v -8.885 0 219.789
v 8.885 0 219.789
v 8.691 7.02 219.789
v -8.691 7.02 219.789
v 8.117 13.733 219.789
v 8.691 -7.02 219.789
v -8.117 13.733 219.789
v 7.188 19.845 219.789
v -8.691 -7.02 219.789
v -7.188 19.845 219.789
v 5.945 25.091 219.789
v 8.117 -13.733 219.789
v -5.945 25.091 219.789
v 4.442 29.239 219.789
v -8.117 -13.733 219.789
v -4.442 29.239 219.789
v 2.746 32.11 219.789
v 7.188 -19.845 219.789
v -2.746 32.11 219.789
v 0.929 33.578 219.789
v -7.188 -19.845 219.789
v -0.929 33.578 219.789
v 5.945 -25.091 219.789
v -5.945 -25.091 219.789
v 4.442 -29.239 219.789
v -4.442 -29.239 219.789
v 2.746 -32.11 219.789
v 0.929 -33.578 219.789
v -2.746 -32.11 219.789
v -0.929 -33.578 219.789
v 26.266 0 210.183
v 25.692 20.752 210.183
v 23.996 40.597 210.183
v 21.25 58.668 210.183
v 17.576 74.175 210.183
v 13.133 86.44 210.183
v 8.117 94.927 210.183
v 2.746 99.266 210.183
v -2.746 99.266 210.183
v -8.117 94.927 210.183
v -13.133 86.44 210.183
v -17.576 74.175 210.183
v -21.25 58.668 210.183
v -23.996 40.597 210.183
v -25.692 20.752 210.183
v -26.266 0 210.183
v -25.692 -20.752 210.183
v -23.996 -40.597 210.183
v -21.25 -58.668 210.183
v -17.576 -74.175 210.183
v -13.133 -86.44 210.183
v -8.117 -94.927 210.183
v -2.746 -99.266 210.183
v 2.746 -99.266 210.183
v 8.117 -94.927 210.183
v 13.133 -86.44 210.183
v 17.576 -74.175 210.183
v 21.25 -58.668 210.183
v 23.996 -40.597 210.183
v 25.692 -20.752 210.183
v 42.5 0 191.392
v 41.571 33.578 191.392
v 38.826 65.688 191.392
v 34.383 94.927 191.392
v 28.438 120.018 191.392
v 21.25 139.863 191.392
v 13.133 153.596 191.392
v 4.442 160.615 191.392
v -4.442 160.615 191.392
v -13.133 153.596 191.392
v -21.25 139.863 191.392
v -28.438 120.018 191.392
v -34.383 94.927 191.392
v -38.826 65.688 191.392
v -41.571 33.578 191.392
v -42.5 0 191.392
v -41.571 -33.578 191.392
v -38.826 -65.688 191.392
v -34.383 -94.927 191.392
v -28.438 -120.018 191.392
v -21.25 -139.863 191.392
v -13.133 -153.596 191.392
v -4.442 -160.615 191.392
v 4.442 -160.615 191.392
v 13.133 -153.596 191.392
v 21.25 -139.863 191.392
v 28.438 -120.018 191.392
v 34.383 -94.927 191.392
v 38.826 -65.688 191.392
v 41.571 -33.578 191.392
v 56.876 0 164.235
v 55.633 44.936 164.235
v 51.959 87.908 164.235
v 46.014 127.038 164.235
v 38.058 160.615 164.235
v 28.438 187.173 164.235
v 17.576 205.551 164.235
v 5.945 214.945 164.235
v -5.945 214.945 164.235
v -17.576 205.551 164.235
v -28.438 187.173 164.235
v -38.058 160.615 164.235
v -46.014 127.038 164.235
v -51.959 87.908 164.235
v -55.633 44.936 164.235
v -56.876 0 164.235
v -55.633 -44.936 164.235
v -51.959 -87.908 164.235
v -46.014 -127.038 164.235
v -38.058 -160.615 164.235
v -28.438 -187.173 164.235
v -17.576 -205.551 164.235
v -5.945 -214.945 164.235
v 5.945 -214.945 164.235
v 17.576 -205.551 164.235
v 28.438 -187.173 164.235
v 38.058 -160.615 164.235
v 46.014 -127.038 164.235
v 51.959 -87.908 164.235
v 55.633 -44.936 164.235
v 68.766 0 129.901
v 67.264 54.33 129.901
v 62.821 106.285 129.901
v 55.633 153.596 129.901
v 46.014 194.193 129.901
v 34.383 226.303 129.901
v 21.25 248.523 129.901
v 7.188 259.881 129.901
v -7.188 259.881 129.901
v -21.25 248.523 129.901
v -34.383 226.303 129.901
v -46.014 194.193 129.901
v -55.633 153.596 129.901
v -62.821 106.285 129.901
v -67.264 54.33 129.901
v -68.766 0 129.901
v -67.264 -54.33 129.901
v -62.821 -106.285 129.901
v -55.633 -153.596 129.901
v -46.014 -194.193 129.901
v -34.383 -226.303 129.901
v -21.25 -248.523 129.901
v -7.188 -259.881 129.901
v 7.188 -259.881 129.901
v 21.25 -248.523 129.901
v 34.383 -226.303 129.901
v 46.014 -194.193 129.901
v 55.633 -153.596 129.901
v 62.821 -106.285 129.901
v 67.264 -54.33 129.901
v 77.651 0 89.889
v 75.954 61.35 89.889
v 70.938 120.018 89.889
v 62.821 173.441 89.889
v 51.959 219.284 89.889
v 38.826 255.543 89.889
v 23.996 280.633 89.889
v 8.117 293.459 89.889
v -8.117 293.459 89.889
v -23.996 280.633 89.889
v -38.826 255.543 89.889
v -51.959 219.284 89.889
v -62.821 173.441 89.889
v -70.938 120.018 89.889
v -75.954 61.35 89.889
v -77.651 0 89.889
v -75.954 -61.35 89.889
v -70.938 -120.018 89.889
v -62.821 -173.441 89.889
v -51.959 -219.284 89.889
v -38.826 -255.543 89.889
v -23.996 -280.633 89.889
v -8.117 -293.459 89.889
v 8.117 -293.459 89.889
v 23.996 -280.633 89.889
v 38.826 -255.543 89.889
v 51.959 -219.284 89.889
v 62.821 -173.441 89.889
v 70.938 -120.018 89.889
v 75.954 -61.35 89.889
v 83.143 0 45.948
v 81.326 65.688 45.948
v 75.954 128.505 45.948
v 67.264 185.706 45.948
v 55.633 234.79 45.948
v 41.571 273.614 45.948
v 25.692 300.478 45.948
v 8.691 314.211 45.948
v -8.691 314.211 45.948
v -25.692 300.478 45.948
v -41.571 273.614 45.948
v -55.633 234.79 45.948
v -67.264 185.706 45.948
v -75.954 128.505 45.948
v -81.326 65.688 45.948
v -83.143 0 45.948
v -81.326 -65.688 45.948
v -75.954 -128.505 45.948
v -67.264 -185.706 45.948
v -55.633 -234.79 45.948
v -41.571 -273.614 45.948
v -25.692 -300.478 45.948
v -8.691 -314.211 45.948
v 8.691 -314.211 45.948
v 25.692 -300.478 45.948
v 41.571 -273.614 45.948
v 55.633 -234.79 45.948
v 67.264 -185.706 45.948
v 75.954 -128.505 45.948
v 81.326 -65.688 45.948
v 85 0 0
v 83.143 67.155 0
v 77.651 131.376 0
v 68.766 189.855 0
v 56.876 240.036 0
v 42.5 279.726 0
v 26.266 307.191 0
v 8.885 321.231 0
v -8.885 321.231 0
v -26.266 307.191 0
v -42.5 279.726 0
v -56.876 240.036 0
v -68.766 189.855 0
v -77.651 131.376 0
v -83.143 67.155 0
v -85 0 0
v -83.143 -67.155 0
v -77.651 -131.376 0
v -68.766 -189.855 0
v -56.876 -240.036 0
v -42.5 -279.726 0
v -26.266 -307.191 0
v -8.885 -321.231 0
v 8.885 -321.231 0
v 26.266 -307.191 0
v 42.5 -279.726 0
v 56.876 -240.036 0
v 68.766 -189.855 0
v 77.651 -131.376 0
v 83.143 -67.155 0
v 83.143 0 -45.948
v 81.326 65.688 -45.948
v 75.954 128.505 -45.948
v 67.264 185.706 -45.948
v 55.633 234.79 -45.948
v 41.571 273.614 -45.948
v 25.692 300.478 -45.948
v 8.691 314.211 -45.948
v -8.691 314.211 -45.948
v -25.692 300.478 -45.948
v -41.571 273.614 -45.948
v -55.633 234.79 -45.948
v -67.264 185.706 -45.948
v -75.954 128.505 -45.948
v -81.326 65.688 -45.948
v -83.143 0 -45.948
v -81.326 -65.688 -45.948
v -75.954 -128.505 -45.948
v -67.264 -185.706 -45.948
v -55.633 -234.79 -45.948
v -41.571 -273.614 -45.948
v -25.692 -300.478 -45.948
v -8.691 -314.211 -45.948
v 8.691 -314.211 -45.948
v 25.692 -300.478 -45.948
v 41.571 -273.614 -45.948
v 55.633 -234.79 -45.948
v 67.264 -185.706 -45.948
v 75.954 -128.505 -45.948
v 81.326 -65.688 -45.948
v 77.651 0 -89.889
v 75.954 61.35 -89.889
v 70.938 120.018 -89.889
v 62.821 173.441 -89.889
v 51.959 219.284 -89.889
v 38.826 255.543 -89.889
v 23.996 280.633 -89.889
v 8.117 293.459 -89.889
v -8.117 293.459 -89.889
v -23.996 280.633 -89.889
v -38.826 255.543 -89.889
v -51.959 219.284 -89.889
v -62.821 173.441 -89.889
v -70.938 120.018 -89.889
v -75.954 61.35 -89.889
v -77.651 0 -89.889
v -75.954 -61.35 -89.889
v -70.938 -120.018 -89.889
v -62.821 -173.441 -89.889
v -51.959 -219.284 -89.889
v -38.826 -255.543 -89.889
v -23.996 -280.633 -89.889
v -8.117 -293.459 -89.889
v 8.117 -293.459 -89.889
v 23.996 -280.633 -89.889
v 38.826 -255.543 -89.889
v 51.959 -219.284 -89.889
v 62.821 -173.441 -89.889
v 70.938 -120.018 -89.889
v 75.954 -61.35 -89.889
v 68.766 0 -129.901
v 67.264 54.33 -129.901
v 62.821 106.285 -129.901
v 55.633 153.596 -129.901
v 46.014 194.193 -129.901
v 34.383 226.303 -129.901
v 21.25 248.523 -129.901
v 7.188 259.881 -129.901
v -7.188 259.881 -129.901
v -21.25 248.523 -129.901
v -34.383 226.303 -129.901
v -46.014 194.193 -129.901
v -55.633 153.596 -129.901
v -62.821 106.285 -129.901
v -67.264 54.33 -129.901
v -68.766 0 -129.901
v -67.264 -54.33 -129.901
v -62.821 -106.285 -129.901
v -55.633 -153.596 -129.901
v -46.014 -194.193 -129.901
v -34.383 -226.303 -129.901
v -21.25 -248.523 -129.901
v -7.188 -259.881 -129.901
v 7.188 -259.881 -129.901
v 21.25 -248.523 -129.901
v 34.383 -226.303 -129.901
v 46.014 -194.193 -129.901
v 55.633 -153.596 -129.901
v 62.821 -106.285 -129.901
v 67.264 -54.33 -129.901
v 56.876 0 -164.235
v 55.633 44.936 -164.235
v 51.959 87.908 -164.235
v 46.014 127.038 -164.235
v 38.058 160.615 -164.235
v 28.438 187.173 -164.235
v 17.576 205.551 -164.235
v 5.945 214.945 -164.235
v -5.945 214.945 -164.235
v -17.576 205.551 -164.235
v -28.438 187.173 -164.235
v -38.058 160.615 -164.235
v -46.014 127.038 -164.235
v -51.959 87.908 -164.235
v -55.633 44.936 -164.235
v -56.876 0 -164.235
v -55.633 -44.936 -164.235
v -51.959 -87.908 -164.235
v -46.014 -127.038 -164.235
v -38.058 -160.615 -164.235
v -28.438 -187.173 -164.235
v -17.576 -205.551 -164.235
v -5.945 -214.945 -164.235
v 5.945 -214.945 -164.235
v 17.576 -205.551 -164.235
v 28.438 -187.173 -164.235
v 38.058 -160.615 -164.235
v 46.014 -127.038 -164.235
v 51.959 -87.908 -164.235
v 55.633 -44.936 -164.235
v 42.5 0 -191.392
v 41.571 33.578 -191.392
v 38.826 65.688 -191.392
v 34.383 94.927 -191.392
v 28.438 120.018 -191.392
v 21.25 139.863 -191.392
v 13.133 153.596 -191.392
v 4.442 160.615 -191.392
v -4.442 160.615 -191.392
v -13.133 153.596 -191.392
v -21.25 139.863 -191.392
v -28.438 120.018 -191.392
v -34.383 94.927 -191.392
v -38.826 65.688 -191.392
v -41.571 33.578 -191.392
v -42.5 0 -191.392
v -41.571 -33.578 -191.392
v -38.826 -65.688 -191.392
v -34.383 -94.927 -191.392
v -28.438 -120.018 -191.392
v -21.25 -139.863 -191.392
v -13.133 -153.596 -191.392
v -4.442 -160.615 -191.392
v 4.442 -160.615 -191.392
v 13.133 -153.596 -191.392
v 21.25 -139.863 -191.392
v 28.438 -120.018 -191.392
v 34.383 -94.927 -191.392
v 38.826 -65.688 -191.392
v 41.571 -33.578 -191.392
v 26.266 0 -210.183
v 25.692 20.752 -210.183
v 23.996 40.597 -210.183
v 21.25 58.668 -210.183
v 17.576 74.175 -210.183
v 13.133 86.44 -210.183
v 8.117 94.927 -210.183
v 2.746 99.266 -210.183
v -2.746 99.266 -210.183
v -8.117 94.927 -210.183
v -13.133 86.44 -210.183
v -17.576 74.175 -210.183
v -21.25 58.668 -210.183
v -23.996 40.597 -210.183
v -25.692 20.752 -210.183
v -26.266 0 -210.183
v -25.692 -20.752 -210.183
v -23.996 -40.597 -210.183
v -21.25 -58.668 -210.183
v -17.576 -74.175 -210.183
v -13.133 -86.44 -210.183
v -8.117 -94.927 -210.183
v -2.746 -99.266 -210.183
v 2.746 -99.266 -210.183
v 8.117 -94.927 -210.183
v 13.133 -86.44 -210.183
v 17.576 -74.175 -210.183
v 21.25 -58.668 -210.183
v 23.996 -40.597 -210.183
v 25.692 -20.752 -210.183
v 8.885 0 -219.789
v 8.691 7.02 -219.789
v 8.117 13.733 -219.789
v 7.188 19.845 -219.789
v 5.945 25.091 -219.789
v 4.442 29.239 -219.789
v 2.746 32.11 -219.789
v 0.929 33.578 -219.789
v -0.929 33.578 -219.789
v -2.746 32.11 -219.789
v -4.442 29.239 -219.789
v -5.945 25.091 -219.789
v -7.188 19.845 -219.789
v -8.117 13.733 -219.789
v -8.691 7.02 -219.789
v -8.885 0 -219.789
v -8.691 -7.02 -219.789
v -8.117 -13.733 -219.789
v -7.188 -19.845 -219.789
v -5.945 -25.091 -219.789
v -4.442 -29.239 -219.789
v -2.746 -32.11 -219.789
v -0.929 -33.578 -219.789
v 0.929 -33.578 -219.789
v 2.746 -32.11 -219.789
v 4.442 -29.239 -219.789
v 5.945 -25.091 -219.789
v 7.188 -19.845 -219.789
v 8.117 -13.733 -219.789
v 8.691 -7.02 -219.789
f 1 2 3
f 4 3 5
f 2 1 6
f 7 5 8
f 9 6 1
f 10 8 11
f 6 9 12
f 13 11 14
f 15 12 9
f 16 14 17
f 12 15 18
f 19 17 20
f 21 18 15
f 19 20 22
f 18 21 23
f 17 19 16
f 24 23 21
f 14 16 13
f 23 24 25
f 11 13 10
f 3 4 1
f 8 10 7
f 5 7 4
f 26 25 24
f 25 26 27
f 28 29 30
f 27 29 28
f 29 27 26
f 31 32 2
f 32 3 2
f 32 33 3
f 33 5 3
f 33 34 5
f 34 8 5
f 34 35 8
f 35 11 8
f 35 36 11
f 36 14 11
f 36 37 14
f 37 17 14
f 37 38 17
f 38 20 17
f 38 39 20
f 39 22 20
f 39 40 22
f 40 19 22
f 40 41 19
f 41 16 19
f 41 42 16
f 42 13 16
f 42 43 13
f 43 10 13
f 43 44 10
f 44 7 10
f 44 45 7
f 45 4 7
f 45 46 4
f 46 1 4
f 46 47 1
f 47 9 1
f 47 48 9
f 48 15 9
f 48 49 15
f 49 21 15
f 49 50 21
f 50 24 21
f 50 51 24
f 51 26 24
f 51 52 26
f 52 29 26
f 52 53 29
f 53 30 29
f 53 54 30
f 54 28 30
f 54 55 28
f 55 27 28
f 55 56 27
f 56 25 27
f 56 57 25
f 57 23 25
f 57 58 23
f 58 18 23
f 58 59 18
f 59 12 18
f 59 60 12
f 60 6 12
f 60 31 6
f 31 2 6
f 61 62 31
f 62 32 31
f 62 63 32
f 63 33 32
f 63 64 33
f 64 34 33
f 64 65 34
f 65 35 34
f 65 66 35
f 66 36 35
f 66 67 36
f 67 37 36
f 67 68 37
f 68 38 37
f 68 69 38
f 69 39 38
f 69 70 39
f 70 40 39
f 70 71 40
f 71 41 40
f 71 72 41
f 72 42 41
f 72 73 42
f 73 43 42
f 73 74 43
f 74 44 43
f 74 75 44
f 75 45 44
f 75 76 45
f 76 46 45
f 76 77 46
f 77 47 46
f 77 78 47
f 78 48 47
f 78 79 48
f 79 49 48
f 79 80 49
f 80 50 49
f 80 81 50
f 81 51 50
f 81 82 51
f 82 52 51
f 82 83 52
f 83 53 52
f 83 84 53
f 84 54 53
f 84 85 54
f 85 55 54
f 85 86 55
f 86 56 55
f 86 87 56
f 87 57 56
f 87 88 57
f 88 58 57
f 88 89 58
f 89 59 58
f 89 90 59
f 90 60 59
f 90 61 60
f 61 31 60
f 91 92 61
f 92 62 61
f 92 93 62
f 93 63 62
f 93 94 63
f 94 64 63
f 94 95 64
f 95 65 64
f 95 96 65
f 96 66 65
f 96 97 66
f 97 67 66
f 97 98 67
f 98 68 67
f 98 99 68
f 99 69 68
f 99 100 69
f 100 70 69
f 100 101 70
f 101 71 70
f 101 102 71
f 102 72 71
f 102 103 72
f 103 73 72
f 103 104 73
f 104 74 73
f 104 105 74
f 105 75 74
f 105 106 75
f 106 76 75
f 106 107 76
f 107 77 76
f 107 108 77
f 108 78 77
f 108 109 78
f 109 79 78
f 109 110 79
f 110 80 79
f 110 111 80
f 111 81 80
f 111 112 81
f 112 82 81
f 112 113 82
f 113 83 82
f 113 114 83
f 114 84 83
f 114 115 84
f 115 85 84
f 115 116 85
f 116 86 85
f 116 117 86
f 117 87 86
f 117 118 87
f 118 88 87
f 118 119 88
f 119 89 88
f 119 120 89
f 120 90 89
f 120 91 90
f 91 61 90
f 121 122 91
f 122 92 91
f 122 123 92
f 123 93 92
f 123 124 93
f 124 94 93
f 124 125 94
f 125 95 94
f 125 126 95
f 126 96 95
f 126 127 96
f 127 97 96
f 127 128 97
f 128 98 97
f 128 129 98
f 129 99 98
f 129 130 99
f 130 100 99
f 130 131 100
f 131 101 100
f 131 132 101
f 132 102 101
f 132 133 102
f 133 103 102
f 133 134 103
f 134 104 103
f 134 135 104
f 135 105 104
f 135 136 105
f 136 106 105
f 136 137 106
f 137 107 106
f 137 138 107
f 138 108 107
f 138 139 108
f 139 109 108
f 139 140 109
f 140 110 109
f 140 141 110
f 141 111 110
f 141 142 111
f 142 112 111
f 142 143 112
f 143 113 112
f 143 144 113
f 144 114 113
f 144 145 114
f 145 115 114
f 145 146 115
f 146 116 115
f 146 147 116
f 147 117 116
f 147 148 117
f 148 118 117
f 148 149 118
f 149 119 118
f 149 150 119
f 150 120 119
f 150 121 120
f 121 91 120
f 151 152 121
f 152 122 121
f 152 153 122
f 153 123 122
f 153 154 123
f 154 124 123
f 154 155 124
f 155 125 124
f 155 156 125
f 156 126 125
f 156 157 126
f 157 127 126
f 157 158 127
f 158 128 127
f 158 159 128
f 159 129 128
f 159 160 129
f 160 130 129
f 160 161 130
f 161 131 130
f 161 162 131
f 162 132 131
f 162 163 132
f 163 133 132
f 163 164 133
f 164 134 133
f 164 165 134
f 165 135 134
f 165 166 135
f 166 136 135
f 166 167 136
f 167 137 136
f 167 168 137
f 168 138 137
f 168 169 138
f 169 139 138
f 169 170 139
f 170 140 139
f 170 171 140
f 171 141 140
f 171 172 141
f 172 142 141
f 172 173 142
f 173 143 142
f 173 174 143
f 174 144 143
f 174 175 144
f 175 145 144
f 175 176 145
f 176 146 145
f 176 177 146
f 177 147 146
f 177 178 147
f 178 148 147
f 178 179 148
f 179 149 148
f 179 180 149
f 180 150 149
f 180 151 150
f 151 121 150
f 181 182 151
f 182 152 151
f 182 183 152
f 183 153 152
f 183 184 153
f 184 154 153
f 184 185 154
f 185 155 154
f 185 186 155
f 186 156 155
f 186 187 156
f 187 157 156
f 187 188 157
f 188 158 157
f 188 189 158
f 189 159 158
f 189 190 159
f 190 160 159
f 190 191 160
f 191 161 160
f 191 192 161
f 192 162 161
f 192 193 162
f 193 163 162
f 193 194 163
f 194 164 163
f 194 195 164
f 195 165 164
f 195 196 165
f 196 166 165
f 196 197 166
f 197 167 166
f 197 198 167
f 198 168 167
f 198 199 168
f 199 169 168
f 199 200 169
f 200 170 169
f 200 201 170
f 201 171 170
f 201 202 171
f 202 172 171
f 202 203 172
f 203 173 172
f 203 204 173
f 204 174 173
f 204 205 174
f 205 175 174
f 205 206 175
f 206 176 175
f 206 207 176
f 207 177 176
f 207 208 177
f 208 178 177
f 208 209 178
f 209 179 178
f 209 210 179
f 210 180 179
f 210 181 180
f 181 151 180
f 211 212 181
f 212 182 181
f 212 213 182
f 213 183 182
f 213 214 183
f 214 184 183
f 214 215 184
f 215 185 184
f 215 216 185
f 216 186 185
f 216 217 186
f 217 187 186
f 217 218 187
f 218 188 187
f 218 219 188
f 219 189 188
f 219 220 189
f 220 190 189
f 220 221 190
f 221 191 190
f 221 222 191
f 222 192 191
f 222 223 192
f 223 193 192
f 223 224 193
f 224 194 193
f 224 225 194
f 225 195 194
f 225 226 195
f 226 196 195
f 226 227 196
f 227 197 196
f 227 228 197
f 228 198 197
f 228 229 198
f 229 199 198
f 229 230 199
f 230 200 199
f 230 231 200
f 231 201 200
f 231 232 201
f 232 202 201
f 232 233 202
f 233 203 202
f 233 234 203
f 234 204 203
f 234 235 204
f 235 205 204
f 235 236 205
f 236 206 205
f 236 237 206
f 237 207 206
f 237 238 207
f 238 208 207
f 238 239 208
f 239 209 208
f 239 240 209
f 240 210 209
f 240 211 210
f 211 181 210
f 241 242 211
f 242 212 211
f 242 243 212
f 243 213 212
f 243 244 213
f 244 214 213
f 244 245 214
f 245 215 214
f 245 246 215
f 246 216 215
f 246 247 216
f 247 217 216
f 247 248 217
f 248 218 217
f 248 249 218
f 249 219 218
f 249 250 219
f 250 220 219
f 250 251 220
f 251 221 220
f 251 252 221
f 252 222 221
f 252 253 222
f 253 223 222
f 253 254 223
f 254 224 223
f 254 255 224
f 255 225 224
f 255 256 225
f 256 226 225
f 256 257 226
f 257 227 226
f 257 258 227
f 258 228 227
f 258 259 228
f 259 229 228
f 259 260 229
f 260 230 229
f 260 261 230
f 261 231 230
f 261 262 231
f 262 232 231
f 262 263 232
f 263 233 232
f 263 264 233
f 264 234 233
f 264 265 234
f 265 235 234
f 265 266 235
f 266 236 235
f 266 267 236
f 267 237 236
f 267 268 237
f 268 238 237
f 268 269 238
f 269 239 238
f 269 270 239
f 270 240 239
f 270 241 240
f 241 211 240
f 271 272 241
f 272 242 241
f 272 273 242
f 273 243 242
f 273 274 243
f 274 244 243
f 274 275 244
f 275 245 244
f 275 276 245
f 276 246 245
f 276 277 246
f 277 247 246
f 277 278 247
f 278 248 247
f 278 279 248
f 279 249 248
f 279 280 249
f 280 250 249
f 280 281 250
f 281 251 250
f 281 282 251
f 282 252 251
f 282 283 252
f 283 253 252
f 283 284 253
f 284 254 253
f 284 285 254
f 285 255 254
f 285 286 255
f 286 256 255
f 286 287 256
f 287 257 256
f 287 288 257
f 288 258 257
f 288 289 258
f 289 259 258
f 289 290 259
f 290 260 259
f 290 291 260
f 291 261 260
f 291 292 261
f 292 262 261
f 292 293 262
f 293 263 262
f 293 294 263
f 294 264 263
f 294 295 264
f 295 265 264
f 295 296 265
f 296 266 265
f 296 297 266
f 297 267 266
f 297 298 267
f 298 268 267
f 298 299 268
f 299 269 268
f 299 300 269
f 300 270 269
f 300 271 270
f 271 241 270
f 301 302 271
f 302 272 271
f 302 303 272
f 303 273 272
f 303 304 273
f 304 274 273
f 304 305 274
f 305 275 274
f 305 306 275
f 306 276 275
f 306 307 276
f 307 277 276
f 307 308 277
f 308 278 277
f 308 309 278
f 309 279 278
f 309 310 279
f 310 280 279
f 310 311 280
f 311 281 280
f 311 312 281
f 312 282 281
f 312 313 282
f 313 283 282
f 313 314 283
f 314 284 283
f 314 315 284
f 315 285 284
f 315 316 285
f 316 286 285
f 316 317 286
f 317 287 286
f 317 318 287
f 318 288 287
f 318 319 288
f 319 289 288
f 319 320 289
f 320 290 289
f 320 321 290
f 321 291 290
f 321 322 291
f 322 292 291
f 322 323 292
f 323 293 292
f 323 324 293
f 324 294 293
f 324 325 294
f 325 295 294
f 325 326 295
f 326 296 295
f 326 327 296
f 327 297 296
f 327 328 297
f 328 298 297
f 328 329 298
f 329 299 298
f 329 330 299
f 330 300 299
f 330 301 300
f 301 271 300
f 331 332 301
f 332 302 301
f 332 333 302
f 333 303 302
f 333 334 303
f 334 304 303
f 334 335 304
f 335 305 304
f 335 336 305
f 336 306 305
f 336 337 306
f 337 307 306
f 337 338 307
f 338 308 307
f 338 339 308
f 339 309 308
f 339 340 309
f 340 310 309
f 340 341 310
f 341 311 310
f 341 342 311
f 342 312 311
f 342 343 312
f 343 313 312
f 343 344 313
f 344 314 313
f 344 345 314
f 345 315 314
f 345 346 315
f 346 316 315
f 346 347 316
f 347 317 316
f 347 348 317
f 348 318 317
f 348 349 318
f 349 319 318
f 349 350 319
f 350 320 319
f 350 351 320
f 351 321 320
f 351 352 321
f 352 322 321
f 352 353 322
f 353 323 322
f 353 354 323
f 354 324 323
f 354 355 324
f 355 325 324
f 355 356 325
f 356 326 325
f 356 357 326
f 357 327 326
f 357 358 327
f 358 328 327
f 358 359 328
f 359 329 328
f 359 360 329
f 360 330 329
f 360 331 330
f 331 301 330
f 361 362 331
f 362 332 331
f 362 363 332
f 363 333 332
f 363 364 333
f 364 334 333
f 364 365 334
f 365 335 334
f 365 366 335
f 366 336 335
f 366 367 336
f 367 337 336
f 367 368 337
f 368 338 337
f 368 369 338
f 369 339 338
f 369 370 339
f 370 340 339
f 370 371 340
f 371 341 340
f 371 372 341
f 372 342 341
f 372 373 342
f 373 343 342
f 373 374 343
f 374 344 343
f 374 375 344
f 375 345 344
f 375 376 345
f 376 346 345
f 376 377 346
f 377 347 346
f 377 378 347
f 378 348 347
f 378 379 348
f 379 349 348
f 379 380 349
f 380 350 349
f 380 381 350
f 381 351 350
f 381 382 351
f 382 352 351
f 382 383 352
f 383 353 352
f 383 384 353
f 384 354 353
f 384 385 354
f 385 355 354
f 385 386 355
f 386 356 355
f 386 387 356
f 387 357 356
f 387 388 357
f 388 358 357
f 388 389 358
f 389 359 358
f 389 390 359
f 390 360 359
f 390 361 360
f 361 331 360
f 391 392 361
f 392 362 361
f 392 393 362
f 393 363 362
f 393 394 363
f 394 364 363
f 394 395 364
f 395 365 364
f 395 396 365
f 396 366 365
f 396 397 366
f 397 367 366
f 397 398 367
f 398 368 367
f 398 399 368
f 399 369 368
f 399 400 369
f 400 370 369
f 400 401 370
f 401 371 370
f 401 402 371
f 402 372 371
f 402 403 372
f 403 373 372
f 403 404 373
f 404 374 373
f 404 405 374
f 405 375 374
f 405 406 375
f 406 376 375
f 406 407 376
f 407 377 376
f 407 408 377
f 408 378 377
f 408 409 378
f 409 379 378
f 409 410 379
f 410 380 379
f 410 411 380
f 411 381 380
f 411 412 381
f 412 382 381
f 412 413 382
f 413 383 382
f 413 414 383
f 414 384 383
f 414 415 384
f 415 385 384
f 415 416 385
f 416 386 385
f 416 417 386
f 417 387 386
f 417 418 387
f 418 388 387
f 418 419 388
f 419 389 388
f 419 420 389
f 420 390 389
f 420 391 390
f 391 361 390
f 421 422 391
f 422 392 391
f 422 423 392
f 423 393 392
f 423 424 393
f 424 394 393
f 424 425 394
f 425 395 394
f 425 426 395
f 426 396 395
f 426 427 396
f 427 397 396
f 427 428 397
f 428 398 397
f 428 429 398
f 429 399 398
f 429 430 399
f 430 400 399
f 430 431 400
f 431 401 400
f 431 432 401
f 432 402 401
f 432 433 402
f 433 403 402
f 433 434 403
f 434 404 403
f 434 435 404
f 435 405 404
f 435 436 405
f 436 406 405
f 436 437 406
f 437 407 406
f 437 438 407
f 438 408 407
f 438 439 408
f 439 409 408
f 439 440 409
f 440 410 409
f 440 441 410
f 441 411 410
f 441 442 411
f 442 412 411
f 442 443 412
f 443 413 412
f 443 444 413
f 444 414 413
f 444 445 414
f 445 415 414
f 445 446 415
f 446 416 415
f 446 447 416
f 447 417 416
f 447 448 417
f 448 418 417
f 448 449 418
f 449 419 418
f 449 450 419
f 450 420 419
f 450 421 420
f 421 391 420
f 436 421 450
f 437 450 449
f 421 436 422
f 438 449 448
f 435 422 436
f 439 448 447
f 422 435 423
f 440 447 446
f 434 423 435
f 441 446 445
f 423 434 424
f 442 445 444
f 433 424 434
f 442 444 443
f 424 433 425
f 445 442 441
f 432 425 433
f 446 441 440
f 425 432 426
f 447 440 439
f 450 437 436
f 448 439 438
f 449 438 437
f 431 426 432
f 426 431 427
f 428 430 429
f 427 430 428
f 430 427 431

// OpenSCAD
// Generated by SolidPython 1.0.1 on 2020-07-29 00:46:47


scale(v = [5, 19, 13]) {
	sphere(r = 17);
}
/***********************************************
*********      SolidPython code:      **********
************************************************
 
# import packages: SolidPython
from solid import *
from solid.utils import *
from itertools import chain, combinations, permutations


class Resize:

    def __init__(self, scad_file):
        self.scad_file = scad_file
        #self.scad_file = import_scad(scad_file)
        # cone/cylinder param:
        self.r1 = 0
        self.r2 = 0
        self.h = 0
        # rectangular prism param:
        self.w = 0
        self.l = 0
        # ellipse param:
        self.r = 0

    # import OpenScad code (file name corresponds to shape)


    # classify shape + parameters
    def assign(self, param1, param2, param3):
        if self.scad_file == 'cone.scad':
            self.r1 = param1
            self.r2 = param2
            self.h = param3
        elif self.scad_file == 'cylinder.scad':
            self.r1 = param1
            self.r2 = param2
            self.h = param3
        elif self.scad_file == 'rectangularPrism.scad':
            self.h = param1
            self.l = param2
            self.w = param3
        else:
            self.r = param1
            self.h = param2

    # resize parameters
    def iterate(self):
        x = range(3, 20, 2)
        i = 1
        if self.scad_file == 'cone.scad':
            tempList = list(permutations(x, 2))
            for temp in tempList:
                param1 = temp[0]
                param2 = temp[1]
                filepath = 'produced_scad_files/' + 'cone' + str(param1) + '_' + str(param2) + '_' + '.scad'
                scad_render_to_file(cylinder(h=param1, r1=param2, r2=0), filepath)

        elif self.scad_file == 'cylinder.scad':
            tempList = list(permutations(x, 3))
            for temp in tempList:
                param1 = temp[0]
                param2 = temp[1]
                filepath = 'produced_scad_files/' + 'cylinder' + str(param1) + '_' + str(param2) + '_' + '.scad'
                scad_render_to_file(cylinder(h=param1, r1=param2, r2=param2), filepath)

        elif self.scad_file == 'rectangularPrism.scad':
            tempList = list(permutations(x, 3))
            for temp in tempList:
                param1 = temp[0]
                param2 = temp[1]
                param3 = temp[2]
                filepath = 'produced_scad_files/' + 'rectangularPrism' + str(param1) + '_' + str(param2) + '_' + str(
                    param3) + '.scad'
                scad_render_to_file(cube(size=(param1, param2, param3)), filepath)

        elif self.scad_file == 'ellipse.scad':
            tempList = list(permutations(x, 4))
            for temp in tempList:
                param1 = temp[0]
                param2 = temp[1]
                param3 = temp[2]
                param4 = temp[3]
                filepath = 'produced_scad_files/' + 'ellipse' + str(param1) + '_' + str(param2) + '_' + str(param3) + '_' + str(param4) + '.scad'
                scad_render_to_file(scale([param1, param2, param3])(sphere(r=param4)), filepath)

    def render_to_scadfile(self):
        scad_render_to_file(scad, 'example.scad') 
 
************************************************/
